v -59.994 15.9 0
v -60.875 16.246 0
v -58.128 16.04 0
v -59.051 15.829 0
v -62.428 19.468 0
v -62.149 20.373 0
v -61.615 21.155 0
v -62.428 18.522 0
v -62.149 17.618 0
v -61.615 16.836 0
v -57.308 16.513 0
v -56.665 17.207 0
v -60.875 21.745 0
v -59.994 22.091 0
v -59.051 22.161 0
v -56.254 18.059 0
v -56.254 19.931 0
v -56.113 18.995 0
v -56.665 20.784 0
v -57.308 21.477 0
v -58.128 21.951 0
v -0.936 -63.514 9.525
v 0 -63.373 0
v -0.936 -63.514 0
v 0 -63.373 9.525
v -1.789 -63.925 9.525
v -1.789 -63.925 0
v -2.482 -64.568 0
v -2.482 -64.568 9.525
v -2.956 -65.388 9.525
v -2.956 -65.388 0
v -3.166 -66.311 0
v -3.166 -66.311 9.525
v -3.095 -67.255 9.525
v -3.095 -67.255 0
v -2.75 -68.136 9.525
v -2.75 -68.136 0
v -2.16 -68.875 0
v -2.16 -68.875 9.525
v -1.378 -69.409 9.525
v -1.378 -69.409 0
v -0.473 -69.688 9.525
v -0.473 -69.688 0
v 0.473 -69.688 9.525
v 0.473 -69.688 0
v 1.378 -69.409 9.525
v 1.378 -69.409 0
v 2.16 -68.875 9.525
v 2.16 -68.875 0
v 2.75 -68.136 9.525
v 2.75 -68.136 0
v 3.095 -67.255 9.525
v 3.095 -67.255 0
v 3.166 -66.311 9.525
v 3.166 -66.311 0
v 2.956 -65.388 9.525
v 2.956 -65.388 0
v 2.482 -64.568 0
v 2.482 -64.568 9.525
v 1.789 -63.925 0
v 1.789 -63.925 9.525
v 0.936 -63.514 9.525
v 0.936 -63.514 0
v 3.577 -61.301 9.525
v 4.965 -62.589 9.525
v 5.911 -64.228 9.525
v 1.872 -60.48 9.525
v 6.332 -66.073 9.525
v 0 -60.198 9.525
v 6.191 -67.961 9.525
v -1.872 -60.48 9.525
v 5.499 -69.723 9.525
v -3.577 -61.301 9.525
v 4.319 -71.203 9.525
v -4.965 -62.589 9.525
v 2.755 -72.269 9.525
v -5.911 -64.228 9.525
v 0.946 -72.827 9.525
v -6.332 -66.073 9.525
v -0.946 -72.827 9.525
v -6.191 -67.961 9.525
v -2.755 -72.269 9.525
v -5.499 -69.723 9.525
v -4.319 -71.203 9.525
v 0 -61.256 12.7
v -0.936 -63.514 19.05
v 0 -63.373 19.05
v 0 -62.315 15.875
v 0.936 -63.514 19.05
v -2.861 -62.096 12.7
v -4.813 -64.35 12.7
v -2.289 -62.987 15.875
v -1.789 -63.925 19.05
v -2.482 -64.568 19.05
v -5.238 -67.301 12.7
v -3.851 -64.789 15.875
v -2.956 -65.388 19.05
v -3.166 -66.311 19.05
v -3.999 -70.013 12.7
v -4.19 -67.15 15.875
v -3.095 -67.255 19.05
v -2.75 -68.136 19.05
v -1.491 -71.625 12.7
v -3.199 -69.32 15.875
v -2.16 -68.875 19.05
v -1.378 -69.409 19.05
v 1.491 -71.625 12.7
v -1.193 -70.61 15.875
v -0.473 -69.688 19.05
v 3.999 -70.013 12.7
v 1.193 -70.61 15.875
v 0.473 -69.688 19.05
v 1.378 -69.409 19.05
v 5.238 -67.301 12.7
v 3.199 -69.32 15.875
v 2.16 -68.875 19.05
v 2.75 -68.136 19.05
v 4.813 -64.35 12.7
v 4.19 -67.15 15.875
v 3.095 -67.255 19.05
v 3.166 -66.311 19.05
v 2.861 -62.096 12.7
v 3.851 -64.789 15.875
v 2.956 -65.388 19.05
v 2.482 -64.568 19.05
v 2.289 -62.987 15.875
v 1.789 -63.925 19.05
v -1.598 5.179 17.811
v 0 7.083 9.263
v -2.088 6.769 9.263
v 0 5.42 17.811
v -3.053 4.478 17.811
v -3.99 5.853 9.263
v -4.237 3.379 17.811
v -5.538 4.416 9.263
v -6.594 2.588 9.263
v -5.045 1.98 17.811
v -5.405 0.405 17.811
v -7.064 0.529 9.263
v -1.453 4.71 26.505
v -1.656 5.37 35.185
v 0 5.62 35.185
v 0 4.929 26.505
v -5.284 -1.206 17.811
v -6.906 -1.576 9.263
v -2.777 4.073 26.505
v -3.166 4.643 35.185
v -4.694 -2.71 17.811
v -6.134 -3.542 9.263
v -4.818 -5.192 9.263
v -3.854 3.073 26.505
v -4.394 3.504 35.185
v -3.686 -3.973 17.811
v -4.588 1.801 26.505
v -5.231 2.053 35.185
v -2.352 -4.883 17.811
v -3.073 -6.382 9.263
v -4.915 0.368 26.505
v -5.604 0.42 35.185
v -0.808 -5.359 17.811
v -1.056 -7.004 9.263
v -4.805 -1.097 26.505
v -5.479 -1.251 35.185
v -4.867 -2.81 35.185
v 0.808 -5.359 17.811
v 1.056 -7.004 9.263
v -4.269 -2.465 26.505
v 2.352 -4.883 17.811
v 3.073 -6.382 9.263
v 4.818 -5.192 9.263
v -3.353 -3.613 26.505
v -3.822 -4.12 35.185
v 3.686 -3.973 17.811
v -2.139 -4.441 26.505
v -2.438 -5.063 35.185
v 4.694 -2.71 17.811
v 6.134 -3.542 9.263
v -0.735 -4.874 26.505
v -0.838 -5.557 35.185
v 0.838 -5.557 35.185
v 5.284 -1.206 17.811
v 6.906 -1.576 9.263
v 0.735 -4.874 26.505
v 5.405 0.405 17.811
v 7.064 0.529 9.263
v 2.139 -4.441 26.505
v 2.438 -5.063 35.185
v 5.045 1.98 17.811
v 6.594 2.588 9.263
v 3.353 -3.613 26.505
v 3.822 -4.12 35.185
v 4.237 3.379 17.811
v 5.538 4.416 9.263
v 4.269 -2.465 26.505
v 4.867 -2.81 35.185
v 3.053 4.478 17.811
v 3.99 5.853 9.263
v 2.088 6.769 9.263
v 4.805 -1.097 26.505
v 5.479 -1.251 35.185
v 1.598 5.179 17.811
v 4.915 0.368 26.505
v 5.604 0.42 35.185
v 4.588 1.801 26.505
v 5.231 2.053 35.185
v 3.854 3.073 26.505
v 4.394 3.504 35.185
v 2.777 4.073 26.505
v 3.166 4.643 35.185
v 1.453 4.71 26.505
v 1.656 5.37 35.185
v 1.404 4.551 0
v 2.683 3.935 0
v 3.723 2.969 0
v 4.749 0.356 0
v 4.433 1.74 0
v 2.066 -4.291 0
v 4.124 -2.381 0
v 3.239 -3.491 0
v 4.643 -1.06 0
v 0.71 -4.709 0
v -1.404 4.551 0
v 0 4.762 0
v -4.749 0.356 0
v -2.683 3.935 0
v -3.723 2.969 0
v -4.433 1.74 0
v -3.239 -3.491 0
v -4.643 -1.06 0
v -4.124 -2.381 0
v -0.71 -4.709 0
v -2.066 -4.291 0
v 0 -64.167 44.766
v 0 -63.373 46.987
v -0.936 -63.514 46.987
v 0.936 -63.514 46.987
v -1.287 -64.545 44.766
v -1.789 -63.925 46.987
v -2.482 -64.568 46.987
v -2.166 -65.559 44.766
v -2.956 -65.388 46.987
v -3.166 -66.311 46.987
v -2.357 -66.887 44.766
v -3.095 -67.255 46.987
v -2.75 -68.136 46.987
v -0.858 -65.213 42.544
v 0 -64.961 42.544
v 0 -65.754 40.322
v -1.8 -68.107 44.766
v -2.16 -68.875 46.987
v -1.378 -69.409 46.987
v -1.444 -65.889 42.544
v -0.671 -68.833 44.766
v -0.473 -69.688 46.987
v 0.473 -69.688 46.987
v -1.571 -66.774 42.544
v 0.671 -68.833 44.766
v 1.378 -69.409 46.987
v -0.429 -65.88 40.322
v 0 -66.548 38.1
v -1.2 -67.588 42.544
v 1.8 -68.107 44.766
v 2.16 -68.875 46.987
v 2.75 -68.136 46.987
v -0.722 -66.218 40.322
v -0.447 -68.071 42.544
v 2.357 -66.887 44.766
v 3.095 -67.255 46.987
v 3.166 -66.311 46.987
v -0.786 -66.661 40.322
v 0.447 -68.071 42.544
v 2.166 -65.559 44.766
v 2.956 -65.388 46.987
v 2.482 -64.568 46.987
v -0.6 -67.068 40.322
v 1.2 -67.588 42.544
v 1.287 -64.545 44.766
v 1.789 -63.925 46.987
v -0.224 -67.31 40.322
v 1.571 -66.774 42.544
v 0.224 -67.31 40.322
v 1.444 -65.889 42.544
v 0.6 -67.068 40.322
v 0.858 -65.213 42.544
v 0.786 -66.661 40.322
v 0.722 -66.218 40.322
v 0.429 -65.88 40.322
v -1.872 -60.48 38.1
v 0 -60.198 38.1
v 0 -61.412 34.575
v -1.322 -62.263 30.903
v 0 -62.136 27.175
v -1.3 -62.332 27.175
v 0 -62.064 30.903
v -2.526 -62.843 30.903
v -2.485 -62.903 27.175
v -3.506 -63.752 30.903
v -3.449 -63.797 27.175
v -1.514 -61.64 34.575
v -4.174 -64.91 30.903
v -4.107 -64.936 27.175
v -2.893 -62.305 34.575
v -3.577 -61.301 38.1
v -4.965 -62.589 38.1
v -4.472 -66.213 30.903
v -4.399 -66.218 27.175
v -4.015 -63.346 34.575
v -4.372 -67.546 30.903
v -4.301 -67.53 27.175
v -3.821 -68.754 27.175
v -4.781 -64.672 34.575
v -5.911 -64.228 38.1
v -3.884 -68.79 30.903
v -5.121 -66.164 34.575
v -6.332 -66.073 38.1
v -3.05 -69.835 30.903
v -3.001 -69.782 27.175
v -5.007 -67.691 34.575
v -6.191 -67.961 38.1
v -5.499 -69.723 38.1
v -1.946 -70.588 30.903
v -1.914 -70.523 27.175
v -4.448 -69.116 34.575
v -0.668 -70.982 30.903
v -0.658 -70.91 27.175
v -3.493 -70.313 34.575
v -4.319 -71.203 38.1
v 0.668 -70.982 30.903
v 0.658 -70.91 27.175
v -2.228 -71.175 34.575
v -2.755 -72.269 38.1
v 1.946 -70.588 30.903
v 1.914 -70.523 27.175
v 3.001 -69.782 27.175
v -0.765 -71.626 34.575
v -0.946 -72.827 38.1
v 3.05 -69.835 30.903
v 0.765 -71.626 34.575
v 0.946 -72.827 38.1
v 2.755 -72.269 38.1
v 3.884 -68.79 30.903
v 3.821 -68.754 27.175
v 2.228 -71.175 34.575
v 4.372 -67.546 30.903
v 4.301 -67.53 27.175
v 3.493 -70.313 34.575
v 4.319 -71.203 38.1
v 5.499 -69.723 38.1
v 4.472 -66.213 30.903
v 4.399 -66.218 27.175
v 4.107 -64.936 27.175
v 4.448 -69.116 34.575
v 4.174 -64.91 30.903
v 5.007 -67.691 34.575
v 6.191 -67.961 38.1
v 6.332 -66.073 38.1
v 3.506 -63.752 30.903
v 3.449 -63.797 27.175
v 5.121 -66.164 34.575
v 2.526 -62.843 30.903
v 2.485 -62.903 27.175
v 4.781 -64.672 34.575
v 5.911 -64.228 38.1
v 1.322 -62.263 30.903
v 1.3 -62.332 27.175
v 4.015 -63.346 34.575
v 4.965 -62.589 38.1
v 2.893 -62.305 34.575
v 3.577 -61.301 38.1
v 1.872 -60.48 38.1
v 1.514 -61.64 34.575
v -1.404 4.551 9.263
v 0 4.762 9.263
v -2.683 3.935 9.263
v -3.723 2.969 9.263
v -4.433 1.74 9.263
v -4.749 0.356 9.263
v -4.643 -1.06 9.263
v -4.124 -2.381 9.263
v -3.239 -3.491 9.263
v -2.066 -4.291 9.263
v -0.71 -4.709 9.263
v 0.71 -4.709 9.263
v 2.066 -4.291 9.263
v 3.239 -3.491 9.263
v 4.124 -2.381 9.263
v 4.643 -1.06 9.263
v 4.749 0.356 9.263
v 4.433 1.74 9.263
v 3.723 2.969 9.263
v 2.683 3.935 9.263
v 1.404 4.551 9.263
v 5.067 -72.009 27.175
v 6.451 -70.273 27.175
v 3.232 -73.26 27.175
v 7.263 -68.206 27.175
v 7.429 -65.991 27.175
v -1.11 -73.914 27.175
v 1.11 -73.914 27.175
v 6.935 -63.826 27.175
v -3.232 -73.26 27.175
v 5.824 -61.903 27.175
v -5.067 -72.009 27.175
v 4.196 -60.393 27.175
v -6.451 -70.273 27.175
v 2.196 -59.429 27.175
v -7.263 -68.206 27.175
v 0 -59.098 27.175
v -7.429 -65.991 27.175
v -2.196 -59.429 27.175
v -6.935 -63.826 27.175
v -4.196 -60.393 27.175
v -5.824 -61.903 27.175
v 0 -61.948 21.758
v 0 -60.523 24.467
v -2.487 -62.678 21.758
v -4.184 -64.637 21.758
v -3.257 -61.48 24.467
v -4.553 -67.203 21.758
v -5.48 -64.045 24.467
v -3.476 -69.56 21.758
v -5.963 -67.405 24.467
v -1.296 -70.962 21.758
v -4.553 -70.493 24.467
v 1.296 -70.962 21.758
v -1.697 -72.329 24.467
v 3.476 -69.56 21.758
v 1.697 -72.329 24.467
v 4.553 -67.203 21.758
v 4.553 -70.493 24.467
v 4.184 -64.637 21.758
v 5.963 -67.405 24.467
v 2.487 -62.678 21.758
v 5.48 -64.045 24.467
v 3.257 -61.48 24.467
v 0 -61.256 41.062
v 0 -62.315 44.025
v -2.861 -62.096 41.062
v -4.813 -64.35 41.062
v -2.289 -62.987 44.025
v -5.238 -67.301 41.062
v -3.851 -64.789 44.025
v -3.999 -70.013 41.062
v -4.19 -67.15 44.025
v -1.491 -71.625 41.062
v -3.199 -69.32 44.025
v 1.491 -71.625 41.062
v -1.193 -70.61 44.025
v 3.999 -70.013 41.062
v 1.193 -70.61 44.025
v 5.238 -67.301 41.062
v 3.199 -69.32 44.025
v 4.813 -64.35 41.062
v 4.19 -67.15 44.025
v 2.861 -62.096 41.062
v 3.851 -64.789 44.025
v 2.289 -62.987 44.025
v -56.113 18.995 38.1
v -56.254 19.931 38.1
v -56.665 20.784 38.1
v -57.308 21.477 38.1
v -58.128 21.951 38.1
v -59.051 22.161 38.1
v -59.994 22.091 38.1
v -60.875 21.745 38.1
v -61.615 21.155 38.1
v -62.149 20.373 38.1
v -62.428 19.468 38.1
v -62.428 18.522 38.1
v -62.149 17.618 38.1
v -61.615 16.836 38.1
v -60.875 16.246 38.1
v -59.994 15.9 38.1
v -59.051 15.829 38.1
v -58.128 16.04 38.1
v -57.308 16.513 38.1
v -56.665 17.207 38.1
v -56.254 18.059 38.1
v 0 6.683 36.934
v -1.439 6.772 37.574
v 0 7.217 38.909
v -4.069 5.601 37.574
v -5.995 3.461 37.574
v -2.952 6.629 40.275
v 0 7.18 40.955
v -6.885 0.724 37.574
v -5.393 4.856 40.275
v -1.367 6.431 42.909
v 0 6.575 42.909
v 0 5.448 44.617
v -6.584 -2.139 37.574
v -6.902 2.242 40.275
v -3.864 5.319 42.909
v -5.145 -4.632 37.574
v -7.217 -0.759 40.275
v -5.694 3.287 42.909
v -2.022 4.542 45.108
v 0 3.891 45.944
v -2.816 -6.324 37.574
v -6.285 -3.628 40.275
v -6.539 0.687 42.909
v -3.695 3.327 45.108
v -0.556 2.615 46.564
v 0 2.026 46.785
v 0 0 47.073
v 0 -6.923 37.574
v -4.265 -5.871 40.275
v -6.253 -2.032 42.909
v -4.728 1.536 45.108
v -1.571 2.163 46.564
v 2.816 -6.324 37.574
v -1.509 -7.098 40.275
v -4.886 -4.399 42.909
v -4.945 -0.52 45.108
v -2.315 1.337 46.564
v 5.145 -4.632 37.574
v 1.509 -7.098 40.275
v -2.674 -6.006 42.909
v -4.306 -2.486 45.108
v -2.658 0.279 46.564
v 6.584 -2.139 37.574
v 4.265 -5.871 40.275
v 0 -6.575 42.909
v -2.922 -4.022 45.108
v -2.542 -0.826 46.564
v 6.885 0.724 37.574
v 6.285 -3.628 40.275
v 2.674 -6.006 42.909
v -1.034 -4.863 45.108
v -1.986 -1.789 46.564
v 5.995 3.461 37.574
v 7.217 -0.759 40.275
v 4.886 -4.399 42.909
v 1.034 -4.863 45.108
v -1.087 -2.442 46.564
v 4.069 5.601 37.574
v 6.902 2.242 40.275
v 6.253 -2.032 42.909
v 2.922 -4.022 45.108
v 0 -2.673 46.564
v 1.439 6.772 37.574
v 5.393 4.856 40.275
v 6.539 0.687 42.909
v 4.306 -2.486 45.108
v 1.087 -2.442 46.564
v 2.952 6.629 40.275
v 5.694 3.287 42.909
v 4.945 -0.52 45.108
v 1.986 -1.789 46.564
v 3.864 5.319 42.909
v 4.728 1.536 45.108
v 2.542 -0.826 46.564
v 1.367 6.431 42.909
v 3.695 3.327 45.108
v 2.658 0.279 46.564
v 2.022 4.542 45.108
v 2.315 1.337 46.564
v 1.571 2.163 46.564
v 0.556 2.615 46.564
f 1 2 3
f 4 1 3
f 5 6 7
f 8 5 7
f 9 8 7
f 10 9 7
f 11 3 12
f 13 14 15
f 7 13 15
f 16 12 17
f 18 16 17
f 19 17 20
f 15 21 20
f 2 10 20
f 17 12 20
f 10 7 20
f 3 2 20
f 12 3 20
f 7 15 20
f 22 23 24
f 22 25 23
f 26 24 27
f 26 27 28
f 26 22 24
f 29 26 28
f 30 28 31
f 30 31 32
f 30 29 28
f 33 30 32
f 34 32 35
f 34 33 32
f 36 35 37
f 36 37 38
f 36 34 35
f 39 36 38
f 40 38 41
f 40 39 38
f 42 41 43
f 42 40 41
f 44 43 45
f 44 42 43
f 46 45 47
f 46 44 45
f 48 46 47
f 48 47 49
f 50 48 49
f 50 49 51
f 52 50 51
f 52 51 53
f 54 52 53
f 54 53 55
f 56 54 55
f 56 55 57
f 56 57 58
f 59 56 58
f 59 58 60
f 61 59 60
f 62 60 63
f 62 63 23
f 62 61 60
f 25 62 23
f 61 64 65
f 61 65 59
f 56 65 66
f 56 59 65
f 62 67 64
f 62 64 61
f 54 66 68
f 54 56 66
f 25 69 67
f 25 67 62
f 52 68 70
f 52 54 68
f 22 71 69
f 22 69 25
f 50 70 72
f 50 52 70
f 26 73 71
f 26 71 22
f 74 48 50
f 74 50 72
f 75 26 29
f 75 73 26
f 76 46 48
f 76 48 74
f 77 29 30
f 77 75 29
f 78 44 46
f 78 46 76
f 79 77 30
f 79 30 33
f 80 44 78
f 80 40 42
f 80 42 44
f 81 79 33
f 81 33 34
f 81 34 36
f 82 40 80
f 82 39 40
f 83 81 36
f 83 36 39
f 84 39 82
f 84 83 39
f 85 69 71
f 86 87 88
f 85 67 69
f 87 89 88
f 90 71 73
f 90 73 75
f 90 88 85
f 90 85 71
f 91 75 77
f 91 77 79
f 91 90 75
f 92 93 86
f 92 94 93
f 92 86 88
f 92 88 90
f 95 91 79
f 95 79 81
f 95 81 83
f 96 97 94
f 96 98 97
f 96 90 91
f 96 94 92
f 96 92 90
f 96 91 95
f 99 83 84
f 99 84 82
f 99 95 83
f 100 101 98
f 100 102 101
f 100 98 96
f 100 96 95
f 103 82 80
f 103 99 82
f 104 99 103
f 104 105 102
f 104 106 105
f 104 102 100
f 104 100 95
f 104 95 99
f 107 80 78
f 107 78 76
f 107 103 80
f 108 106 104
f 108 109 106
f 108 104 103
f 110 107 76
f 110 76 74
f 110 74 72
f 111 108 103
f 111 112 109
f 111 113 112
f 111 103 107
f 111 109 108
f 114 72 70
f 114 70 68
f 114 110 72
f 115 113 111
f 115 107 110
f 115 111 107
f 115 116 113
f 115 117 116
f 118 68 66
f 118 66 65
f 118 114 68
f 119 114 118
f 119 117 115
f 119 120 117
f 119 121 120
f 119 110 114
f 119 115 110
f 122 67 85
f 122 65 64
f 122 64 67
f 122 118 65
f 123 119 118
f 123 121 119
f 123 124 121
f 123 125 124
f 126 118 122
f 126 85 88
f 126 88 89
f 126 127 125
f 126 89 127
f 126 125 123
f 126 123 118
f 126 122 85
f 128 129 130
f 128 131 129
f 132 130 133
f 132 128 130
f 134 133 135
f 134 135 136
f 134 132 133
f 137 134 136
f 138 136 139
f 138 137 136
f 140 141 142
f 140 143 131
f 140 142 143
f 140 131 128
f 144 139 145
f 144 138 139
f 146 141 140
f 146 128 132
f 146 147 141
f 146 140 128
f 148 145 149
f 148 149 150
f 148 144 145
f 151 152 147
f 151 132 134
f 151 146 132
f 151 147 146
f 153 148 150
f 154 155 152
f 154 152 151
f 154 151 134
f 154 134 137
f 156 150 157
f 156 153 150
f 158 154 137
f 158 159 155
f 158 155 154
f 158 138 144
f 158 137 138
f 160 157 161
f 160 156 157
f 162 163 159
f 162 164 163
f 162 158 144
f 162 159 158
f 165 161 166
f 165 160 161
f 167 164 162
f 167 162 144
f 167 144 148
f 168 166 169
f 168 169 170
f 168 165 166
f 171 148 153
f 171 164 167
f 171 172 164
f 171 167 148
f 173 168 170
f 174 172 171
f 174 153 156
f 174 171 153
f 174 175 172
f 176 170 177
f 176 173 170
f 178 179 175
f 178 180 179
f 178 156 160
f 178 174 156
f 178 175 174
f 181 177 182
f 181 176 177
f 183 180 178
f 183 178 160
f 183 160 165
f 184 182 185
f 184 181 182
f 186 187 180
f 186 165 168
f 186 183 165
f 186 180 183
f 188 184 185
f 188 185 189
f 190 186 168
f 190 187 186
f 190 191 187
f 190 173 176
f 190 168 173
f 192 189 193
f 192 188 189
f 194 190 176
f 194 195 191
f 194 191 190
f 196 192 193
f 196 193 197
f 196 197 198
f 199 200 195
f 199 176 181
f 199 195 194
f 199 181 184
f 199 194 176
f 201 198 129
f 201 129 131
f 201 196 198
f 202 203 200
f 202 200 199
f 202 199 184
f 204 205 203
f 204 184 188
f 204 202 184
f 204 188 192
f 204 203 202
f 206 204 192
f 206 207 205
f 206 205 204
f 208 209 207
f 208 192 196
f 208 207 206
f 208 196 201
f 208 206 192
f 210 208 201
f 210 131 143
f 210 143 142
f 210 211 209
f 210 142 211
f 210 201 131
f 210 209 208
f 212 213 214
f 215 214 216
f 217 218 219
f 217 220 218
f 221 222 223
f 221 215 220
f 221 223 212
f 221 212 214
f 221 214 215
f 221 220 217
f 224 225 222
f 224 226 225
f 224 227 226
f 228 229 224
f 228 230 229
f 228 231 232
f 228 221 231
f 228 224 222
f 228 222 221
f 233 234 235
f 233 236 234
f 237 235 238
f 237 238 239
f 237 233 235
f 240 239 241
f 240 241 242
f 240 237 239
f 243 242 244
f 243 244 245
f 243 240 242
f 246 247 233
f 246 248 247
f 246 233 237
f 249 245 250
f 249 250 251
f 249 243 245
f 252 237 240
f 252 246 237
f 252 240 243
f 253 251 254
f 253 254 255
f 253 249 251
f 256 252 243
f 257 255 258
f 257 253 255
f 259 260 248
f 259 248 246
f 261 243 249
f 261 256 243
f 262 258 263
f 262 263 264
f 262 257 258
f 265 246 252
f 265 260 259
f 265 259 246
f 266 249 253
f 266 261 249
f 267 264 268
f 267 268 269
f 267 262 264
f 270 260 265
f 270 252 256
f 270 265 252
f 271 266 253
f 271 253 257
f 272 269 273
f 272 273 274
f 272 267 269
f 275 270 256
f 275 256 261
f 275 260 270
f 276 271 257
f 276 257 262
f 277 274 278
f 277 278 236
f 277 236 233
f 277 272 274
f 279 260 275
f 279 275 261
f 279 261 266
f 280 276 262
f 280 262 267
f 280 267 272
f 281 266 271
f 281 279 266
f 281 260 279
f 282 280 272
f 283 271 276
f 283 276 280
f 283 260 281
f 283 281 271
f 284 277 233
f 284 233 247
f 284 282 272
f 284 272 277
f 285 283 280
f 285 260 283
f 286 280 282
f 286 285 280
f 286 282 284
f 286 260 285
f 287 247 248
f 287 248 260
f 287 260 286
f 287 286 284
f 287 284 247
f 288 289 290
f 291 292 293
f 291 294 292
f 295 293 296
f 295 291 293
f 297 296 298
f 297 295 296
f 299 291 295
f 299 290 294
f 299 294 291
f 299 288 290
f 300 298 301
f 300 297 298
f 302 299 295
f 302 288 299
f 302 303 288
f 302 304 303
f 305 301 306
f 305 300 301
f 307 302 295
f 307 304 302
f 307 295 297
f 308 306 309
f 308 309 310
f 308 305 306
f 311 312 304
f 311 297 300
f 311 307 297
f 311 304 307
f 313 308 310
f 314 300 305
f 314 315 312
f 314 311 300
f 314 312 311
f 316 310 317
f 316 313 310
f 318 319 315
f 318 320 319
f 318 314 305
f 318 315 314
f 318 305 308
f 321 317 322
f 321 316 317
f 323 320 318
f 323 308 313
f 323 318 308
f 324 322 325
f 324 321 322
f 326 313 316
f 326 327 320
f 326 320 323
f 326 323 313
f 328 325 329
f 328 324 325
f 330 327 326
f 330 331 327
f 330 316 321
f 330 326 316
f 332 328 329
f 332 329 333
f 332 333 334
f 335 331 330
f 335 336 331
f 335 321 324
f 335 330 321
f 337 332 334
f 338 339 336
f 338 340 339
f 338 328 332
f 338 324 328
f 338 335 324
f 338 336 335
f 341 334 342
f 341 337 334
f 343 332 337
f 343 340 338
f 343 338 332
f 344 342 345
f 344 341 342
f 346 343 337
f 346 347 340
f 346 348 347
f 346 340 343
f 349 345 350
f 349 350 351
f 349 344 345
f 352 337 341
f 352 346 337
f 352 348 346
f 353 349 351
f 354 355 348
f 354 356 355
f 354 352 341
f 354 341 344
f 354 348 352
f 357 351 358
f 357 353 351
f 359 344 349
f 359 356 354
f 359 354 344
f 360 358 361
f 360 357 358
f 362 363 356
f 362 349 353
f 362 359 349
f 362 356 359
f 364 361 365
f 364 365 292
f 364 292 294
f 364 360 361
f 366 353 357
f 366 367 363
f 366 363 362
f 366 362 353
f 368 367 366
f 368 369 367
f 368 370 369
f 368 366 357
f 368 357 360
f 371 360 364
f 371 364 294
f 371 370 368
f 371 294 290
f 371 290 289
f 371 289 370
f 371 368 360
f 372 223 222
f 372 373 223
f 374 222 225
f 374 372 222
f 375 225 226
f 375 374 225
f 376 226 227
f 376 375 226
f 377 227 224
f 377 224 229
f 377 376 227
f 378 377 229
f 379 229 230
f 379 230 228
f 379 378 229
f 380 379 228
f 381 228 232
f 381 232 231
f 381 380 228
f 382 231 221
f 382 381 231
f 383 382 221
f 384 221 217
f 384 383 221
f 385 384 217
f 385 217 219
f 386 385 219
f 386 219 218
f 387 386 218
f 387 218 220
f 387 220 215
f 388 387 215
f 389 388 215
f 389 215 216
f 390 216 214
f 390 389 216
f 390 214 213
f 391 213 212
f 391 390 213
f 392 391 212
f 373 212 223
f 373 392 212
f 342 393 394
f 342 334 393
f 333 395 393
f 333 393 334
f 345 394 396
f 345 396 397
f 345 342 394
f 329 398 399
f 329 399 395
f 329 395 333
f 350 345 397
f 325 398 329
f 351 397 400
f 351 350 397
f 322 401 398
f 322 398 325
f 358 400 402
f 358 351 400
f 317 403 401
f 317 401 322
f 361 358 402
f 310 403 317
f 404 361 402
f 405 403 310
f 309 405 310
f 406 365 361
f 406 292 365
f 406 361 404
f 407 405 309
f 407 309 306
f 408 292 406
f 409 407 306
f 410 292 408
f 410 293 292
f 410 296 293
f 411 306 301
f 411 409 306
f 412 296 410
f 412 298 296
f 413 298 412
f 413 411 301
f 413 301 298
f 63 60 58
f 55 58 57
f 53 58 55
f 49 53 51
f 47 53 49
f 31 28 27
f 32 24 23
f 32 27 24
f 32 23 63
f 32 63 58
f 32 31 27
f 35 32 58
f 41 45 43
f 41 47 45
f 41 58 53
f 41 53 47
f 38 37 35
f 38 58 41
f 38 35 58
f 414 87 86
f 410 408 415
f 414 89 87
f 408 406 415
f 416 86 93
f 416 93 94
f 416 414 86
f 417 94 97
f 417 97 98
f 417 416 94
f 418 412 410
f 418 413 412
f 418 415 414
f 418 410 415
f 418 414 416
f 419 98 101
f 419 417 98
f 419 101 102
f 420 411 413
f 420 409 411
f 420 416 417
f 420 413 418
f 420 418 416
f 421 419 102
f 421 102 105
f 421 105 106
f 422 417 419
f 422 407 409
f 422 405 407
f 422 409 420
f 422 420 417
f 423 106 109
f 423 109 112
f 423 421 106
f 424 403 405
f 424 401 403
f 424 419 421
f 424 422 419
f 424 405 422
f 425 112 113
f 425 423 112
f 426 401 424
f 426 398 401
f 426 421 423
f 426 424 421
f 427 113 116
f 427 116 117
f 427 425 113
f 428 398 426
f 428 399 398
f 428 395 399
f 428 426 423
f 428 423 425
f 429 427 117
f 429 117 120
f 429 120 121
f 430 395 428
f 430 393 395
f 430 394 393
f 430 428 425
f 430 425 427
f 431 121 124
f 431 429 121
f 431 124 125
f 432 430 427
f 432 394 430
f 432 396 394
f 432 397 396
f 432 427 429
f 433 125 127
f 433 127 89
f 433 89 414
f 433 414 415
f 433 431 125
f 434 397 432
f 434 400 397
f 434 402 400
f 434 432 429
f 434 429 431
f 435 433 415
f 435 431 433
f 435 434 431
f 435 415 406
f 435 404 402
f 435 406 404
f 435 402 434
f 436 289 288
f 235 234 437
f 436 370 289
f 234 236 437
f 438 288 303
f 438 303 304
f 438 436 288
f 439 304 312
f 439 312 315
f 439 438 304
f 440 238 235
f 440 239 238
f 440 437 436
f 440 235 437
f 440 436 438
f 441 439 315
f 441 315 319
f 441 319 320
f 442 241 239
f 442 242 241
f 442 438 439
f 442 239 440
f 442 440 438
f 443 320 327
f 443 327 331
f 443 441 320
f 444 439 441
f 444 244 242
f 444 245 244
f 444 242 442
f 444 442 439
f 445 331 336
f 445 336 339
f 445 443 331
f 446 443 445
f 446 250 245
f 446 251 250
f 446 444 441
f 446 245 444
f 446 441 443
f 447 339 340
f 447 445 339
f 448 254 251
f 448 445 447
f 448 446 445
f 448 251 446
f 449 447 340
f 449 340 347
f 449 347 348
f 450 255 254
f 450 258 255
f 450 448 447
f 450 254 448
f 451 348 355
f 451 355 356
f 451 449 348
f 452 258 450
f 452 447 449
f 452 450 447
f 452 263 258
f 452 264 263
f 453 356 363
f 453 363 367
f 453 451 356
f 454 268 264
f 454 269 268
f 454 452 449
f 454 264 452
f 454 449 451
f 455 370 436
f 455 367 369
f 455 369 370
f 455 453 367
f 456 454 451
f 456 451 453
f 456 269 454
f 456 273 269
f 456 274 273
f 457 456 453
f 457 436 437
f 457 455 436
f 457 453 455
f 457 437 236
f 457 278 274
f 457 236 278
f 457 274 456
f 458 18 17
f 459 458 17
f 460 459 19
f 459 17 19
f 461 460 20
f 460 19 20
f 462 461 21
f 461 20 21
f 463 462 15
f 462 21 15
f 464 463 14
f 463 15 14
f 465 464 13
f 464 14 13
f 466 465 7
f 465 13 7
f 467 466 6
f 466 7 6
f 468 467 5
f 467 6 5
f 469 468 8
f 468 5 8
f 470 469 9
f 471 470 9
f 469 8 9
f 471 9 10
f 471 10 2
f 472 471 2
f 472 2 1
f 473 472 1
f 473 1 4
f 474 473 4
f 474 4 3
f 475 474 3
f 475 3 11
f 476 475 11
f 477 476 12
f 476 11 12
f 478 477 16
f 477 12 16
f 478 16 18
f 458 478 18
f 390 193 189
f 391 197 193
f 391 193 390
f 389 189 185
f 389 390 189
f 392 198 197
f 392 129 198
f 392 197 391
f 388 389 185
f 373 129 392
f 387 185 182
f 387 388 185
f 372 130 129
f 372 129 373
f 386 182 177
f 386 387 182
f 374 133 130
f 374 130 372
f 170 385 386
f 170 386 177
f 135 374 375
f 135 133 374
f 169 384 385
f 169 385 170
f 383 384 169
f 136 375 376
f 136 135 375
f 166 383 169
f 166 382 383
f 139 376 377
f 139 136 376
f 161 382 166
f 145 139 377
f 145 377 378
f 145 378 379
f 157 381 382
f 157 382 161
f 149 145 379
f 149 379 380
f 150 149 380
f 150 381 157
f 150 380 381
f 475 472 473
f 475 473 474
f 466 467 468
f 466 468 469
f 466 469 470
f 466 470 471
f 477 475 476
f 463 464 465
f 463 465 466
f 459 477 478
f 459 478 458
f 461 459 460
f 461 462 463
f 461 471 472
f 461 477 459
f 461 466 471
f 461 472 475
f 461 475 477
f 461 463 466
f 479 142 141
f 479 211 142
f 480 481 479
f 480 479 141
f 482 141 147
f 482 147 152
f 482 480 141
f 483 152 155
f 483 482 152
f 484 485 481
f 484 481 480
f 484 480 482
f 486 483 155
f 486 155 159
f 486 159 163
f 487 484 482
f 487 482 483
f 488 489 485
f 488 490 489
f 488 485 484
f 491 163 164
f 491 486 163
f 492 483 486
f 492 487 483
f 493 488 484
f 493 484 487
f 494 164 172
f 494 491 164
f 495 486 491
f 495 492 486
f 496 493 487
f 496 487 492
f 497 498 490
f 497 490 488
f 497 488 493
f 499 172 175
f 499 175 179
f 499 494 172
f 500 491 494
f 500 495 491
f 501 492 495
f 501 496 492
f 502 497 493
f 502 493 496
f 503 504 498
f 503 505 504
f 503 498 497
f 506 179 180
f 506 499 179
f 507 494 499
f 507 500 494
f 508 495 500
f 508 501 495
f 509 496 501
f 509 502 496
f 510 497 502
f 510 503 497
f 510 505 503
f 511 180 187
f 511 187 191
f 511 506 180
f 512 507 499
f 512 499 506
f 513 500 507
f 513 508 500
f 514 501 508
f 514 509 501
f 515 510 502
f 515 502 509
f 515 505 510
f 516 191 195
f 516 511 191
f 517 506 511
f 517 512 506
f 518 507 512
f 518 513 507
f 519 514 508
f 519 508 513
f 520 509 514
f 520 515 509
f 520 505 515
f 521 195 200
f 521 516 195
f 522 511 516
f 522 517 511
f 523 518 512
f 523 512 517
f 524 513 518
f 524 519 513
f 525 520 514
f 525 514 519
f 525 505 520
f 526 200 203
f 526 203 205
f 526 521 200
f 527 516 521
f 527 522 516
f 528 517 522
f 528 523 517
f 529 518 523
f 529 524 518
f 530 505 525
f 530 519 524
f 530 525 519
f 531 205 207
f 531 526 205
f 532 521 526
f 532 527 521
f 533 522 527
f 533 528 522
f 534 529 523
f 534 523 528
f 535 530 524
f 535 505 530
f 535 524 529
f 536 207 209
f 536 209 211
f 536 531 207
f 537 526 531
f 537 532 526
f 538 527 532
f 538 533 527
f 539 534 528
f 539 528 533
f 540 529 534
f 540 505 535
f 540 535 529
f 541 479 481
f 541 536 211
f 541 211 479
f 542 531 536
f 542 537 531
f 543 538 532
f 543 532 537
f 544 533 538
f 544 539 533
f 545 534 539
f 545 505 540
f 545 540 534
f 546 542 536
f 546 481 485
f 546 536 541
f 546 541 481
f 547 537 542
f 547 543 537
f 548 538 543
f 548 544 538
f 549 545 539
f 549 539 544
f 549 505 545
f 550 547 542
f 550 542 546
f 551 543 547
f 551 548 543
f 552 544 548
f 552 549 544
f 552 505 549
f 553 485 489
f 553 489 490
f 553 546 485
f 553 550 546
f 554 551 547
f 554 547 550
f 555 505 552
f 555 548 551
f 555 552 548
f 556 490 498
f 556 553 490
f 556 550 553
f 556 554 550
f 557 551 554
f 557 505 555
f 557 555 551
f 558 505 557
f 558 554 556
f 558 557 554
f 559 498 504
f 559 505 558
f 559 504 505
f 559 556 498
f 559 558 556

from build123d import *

# Parameters (mm, degrees)
F0_R     = 3.175
F1_DEPTH = 38.1


with BuildPart() as f1:
    # F0 (on Top) → F1 (new body)
    with BuildSketch(Plane.XY):
        with Locations((-59.287984, 18.995181)):
            Circle(F0_R)
    extrude(amount=F1_DEPTH)


with BuildPart() as f3:
    # F2 (on Right) → F3 (revolve)
    with BuildSketch(Plane.YZ):
        with BuildLine():
            Line((0, 47.073067), (0, 0))
            Line((0, 0), (4.7625, 0))
            Line((4.7625, 0), (4.7625, 9.263063))
            Line((4.7625, 9.263063), (7.083322, 9.263063))
            ThreePointArc((7.083322, 9.263063), (5.026822, 22.149482), (5.619855, 35.185483))
            ThreePointArc((5.619855, 35.185483), (6.574523, 42.908988), (0, 47.073067))
        make_face()
    revolve(axis=Axis((0, 0, 23.536534), (0, 0, 1)))


with BuildPart() as f5:
    # F4 (on Right) → F5 (revolve)
    with BuildSketch(Plane.YZ):
        with BuildLine():
            Line((-66.548005, 38.1), (-66.548005, 0))
            Line((-66.548005, 0), (-63.373005, 0))
            Line((-63.373005, 0), (-63.373005, 9.525))
            Line((-63.373005, 9.525), (-60.198005, 9.525))
            Line((-60.198005, 9.525), (-63.373005, 19.05))
            Line((-63.373005, 19.05), (-59.098486, 27.175354))
            Line((-59.098486, 27.175354), (-62.136363, 27.175354))
            ThreePointArc((-62.136363, 27.175354), (-61.809706, 32.75168), (-60.198005, 38.1))
            Line((-60.198005, 38.1), (-63.373005, 46.987355))
            Line((-63.373005, 46.987355), (-66.548005, 38.1))
        make_face()
    revolve(axis=Axis((0, -66.548005, 19.05), (0, 0, 1)))


solid = Compound([f1.part, f3.part, f5.part])
